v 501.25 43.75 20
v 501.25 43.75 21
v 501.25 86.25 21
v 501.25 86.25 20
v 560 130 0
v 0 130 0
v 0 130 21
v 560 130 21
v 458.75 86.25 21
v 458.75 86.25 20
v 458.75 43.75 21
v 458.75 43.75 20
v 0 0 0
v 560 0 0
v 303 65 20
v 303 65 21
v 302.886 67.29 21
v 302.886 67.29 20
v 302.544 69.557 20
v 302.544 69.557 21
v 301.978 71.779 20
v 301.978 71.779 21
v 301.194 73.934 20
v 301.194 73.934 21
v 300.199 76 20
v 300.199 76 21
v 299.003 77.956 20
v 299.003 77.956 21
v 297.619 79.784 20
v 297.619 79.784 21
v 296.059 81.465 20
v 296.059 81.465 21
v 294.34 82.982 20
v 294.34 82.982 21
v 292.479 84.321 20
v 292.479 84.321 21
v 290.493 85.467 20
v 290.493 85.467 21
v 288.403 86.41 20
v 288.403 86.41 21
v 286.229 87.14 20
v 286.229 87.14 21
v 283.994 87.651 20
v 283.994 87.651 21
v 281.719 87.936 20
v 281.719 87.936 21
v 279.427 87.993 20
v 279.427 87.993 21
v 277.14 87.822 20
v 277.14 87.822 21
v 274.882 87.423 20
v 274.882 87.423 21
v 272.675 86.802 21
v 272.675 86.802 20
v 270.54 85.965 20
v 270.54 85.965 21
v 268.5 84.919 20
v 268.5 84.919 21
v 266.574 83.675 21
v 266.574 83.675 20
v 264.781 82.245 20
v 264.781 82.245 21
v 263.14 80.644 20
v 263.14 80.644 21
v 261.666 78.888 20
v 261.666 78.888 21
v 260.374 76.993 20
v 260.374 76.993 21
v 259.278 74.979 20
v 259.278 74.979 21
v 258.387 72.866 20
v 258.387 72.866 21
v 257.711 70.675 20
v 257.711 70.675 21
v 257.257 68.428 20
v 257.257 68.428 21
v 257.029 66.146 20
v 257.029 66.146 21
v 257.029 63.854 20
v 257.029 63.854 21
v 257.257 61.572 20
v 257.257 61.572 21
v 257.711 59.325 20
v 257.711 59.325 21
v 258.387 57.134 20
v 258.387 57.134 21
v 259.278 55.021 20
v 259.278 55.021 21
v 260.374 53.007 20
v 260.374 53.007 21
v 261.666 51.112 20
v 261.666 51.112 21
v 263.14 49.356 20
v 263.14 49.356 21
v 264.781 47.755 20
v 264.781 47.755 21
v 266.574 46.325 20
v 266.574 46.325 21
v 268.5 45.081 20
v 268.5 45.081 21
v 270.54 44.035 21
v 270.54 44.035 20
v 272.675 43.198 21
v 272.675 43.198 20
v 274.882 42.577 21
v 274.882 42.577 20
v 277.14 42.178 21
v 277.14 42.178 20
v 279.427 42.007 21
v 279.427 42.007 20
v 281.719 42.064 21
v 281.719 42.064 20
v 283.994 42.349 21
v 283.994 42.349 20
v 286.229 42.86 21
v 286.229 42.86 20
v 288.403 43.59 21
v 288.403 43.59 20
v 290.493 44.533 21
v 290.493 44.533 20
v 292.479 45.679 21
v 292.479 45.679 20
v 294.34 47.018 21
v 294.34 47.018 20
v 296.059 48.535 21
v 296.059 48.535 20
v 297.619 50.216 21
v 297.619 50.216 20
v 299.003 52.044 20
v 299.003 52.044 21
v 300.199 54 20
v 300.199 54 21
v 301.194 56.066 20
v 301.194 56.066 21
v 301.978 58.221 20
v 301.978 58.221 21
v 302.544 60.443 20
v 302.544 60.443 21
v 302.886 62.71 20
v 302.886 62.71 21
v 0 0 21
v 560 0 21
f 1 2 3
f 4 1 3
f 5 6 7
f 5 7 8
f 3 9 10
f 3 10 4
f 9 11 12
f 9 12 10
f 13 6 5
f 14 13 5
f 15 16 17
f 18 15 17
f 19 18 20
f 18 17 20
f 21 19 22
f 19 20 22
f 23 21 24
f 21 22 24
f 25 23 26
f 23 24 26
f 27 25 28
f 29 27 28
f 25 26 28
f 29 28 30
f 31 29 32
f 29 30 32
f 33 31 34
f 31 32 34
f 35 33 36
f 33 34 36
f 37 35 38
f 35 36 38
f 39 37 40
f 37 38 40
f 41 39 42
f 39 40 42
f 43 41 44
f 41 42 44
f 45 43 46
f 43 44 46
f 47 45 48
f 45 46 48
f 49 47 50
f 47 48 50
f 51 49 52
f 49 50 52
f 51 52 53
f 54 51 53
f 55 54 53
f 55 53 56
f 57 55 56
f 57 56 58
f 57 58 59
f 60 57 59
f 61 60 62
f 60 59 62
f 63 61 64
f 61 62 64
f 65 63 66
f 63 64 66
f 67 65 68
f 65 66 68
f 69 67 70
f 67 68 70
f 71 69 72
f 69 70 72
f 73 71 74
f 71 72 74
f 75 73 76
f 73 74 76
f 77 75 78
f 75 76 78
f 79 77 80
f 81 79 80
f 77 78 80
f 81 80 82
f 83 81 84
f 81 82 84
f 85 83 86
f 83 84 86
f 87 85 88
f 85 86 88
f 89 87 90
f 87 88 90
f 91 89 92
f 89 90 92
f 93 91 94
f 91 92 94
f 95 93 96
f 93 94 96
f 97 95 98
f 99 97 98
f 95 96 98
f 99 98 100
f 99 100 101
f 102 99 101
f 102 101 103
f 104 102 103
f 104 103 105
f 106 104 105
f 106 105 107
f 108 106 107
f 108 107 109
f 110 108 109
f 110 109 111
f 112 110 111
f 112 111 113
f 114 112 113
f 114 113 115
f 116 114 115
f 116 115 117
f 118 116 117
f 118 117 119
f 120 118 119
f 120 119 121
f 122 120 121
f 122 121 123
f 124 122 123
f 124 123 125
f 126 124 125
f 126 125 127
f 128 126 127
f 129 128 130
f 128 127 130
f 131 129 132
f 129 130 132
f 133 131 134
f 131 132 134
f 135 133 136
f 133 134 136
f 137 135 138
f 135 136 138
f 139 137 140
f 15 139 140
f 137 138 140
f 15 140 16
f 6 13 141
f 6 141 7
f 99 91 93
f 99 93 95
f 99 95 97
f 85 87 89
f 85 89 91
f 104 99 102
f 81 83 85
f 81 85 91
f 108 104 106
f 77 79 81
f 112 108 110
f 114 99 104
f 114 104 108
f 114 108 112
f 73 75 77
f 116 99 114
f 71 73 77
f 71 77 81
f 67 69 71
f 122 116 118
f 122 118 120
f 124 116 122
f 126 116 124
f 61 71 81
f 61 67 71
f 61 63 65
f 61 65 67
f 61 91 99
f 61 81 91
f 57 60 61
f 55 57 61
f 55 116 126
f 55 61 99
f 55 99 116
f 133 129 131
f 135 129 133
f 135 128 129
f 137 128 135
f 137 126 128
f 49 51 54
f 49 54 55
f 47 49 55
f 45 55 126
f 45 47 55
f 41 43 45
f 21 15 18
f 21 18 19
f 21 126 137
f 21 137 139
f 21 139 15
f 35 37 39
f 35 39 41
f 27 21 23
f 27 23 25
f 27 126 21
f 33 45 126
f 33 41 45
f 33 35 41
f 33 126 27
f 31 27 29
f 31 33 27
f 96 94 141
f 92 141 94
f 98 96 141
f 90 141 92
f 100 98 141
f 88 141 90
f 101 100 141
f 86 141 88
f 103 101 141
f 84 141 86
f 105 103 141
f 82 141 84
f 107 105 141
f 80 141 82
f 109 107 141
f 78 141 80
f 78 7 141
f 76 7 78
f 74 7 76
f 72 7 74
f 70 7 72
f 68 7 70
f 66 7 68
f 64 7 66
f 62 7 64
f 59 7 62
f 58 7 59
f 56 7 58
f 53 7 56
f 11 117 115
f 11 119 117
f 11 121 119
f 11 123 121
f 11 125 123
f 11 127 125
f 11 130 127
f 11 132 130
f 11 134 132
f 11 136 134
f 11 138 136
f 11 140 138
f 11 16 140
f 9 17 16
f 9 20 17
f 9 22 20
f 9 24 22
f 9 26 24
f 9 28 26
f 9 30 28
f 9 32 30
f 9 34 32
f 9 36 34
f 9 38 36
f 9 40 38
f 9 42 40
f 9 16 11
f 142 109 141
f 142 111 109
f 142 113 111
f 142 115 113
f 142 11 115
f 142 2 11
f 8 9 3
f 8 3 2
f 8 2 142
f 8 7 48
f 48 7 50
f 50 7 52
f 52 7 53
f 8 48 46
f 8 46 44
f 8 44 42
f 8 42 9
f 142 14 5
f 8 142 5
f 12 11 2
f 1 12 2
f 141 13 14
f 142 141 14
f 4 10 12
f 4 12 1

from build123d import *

# Parameters (mm, degrees)
F0_W     = 560
F0_H     = 130
F1_DEPTH = 21
F2_R     = 23
F2_W     = 42.5
F2_H     = 42.5
F3_DEPTH = 1


with BuildPart() as f1:
    # F0 (on Top) → F1 (new body)
    with BuildSketch(Plane.XY):
        with Locations((280, 65)):
            Rectangle(F0_W, F0_H)
    extrude(amount=F1_DEPTH)

    # F2 (on face) → F3 (cut)
    with BuildSketch(Plane.XY.offset(21)):
        with Locations((280, 65)):
            Circle(F2_R)
        with Locations((480, 65)):
            Rectangle(F2_W, F2_H)
    extrude(amount=-F3_DEPTH, mode=Mode.SUBTRACT)


solid = f1.part
